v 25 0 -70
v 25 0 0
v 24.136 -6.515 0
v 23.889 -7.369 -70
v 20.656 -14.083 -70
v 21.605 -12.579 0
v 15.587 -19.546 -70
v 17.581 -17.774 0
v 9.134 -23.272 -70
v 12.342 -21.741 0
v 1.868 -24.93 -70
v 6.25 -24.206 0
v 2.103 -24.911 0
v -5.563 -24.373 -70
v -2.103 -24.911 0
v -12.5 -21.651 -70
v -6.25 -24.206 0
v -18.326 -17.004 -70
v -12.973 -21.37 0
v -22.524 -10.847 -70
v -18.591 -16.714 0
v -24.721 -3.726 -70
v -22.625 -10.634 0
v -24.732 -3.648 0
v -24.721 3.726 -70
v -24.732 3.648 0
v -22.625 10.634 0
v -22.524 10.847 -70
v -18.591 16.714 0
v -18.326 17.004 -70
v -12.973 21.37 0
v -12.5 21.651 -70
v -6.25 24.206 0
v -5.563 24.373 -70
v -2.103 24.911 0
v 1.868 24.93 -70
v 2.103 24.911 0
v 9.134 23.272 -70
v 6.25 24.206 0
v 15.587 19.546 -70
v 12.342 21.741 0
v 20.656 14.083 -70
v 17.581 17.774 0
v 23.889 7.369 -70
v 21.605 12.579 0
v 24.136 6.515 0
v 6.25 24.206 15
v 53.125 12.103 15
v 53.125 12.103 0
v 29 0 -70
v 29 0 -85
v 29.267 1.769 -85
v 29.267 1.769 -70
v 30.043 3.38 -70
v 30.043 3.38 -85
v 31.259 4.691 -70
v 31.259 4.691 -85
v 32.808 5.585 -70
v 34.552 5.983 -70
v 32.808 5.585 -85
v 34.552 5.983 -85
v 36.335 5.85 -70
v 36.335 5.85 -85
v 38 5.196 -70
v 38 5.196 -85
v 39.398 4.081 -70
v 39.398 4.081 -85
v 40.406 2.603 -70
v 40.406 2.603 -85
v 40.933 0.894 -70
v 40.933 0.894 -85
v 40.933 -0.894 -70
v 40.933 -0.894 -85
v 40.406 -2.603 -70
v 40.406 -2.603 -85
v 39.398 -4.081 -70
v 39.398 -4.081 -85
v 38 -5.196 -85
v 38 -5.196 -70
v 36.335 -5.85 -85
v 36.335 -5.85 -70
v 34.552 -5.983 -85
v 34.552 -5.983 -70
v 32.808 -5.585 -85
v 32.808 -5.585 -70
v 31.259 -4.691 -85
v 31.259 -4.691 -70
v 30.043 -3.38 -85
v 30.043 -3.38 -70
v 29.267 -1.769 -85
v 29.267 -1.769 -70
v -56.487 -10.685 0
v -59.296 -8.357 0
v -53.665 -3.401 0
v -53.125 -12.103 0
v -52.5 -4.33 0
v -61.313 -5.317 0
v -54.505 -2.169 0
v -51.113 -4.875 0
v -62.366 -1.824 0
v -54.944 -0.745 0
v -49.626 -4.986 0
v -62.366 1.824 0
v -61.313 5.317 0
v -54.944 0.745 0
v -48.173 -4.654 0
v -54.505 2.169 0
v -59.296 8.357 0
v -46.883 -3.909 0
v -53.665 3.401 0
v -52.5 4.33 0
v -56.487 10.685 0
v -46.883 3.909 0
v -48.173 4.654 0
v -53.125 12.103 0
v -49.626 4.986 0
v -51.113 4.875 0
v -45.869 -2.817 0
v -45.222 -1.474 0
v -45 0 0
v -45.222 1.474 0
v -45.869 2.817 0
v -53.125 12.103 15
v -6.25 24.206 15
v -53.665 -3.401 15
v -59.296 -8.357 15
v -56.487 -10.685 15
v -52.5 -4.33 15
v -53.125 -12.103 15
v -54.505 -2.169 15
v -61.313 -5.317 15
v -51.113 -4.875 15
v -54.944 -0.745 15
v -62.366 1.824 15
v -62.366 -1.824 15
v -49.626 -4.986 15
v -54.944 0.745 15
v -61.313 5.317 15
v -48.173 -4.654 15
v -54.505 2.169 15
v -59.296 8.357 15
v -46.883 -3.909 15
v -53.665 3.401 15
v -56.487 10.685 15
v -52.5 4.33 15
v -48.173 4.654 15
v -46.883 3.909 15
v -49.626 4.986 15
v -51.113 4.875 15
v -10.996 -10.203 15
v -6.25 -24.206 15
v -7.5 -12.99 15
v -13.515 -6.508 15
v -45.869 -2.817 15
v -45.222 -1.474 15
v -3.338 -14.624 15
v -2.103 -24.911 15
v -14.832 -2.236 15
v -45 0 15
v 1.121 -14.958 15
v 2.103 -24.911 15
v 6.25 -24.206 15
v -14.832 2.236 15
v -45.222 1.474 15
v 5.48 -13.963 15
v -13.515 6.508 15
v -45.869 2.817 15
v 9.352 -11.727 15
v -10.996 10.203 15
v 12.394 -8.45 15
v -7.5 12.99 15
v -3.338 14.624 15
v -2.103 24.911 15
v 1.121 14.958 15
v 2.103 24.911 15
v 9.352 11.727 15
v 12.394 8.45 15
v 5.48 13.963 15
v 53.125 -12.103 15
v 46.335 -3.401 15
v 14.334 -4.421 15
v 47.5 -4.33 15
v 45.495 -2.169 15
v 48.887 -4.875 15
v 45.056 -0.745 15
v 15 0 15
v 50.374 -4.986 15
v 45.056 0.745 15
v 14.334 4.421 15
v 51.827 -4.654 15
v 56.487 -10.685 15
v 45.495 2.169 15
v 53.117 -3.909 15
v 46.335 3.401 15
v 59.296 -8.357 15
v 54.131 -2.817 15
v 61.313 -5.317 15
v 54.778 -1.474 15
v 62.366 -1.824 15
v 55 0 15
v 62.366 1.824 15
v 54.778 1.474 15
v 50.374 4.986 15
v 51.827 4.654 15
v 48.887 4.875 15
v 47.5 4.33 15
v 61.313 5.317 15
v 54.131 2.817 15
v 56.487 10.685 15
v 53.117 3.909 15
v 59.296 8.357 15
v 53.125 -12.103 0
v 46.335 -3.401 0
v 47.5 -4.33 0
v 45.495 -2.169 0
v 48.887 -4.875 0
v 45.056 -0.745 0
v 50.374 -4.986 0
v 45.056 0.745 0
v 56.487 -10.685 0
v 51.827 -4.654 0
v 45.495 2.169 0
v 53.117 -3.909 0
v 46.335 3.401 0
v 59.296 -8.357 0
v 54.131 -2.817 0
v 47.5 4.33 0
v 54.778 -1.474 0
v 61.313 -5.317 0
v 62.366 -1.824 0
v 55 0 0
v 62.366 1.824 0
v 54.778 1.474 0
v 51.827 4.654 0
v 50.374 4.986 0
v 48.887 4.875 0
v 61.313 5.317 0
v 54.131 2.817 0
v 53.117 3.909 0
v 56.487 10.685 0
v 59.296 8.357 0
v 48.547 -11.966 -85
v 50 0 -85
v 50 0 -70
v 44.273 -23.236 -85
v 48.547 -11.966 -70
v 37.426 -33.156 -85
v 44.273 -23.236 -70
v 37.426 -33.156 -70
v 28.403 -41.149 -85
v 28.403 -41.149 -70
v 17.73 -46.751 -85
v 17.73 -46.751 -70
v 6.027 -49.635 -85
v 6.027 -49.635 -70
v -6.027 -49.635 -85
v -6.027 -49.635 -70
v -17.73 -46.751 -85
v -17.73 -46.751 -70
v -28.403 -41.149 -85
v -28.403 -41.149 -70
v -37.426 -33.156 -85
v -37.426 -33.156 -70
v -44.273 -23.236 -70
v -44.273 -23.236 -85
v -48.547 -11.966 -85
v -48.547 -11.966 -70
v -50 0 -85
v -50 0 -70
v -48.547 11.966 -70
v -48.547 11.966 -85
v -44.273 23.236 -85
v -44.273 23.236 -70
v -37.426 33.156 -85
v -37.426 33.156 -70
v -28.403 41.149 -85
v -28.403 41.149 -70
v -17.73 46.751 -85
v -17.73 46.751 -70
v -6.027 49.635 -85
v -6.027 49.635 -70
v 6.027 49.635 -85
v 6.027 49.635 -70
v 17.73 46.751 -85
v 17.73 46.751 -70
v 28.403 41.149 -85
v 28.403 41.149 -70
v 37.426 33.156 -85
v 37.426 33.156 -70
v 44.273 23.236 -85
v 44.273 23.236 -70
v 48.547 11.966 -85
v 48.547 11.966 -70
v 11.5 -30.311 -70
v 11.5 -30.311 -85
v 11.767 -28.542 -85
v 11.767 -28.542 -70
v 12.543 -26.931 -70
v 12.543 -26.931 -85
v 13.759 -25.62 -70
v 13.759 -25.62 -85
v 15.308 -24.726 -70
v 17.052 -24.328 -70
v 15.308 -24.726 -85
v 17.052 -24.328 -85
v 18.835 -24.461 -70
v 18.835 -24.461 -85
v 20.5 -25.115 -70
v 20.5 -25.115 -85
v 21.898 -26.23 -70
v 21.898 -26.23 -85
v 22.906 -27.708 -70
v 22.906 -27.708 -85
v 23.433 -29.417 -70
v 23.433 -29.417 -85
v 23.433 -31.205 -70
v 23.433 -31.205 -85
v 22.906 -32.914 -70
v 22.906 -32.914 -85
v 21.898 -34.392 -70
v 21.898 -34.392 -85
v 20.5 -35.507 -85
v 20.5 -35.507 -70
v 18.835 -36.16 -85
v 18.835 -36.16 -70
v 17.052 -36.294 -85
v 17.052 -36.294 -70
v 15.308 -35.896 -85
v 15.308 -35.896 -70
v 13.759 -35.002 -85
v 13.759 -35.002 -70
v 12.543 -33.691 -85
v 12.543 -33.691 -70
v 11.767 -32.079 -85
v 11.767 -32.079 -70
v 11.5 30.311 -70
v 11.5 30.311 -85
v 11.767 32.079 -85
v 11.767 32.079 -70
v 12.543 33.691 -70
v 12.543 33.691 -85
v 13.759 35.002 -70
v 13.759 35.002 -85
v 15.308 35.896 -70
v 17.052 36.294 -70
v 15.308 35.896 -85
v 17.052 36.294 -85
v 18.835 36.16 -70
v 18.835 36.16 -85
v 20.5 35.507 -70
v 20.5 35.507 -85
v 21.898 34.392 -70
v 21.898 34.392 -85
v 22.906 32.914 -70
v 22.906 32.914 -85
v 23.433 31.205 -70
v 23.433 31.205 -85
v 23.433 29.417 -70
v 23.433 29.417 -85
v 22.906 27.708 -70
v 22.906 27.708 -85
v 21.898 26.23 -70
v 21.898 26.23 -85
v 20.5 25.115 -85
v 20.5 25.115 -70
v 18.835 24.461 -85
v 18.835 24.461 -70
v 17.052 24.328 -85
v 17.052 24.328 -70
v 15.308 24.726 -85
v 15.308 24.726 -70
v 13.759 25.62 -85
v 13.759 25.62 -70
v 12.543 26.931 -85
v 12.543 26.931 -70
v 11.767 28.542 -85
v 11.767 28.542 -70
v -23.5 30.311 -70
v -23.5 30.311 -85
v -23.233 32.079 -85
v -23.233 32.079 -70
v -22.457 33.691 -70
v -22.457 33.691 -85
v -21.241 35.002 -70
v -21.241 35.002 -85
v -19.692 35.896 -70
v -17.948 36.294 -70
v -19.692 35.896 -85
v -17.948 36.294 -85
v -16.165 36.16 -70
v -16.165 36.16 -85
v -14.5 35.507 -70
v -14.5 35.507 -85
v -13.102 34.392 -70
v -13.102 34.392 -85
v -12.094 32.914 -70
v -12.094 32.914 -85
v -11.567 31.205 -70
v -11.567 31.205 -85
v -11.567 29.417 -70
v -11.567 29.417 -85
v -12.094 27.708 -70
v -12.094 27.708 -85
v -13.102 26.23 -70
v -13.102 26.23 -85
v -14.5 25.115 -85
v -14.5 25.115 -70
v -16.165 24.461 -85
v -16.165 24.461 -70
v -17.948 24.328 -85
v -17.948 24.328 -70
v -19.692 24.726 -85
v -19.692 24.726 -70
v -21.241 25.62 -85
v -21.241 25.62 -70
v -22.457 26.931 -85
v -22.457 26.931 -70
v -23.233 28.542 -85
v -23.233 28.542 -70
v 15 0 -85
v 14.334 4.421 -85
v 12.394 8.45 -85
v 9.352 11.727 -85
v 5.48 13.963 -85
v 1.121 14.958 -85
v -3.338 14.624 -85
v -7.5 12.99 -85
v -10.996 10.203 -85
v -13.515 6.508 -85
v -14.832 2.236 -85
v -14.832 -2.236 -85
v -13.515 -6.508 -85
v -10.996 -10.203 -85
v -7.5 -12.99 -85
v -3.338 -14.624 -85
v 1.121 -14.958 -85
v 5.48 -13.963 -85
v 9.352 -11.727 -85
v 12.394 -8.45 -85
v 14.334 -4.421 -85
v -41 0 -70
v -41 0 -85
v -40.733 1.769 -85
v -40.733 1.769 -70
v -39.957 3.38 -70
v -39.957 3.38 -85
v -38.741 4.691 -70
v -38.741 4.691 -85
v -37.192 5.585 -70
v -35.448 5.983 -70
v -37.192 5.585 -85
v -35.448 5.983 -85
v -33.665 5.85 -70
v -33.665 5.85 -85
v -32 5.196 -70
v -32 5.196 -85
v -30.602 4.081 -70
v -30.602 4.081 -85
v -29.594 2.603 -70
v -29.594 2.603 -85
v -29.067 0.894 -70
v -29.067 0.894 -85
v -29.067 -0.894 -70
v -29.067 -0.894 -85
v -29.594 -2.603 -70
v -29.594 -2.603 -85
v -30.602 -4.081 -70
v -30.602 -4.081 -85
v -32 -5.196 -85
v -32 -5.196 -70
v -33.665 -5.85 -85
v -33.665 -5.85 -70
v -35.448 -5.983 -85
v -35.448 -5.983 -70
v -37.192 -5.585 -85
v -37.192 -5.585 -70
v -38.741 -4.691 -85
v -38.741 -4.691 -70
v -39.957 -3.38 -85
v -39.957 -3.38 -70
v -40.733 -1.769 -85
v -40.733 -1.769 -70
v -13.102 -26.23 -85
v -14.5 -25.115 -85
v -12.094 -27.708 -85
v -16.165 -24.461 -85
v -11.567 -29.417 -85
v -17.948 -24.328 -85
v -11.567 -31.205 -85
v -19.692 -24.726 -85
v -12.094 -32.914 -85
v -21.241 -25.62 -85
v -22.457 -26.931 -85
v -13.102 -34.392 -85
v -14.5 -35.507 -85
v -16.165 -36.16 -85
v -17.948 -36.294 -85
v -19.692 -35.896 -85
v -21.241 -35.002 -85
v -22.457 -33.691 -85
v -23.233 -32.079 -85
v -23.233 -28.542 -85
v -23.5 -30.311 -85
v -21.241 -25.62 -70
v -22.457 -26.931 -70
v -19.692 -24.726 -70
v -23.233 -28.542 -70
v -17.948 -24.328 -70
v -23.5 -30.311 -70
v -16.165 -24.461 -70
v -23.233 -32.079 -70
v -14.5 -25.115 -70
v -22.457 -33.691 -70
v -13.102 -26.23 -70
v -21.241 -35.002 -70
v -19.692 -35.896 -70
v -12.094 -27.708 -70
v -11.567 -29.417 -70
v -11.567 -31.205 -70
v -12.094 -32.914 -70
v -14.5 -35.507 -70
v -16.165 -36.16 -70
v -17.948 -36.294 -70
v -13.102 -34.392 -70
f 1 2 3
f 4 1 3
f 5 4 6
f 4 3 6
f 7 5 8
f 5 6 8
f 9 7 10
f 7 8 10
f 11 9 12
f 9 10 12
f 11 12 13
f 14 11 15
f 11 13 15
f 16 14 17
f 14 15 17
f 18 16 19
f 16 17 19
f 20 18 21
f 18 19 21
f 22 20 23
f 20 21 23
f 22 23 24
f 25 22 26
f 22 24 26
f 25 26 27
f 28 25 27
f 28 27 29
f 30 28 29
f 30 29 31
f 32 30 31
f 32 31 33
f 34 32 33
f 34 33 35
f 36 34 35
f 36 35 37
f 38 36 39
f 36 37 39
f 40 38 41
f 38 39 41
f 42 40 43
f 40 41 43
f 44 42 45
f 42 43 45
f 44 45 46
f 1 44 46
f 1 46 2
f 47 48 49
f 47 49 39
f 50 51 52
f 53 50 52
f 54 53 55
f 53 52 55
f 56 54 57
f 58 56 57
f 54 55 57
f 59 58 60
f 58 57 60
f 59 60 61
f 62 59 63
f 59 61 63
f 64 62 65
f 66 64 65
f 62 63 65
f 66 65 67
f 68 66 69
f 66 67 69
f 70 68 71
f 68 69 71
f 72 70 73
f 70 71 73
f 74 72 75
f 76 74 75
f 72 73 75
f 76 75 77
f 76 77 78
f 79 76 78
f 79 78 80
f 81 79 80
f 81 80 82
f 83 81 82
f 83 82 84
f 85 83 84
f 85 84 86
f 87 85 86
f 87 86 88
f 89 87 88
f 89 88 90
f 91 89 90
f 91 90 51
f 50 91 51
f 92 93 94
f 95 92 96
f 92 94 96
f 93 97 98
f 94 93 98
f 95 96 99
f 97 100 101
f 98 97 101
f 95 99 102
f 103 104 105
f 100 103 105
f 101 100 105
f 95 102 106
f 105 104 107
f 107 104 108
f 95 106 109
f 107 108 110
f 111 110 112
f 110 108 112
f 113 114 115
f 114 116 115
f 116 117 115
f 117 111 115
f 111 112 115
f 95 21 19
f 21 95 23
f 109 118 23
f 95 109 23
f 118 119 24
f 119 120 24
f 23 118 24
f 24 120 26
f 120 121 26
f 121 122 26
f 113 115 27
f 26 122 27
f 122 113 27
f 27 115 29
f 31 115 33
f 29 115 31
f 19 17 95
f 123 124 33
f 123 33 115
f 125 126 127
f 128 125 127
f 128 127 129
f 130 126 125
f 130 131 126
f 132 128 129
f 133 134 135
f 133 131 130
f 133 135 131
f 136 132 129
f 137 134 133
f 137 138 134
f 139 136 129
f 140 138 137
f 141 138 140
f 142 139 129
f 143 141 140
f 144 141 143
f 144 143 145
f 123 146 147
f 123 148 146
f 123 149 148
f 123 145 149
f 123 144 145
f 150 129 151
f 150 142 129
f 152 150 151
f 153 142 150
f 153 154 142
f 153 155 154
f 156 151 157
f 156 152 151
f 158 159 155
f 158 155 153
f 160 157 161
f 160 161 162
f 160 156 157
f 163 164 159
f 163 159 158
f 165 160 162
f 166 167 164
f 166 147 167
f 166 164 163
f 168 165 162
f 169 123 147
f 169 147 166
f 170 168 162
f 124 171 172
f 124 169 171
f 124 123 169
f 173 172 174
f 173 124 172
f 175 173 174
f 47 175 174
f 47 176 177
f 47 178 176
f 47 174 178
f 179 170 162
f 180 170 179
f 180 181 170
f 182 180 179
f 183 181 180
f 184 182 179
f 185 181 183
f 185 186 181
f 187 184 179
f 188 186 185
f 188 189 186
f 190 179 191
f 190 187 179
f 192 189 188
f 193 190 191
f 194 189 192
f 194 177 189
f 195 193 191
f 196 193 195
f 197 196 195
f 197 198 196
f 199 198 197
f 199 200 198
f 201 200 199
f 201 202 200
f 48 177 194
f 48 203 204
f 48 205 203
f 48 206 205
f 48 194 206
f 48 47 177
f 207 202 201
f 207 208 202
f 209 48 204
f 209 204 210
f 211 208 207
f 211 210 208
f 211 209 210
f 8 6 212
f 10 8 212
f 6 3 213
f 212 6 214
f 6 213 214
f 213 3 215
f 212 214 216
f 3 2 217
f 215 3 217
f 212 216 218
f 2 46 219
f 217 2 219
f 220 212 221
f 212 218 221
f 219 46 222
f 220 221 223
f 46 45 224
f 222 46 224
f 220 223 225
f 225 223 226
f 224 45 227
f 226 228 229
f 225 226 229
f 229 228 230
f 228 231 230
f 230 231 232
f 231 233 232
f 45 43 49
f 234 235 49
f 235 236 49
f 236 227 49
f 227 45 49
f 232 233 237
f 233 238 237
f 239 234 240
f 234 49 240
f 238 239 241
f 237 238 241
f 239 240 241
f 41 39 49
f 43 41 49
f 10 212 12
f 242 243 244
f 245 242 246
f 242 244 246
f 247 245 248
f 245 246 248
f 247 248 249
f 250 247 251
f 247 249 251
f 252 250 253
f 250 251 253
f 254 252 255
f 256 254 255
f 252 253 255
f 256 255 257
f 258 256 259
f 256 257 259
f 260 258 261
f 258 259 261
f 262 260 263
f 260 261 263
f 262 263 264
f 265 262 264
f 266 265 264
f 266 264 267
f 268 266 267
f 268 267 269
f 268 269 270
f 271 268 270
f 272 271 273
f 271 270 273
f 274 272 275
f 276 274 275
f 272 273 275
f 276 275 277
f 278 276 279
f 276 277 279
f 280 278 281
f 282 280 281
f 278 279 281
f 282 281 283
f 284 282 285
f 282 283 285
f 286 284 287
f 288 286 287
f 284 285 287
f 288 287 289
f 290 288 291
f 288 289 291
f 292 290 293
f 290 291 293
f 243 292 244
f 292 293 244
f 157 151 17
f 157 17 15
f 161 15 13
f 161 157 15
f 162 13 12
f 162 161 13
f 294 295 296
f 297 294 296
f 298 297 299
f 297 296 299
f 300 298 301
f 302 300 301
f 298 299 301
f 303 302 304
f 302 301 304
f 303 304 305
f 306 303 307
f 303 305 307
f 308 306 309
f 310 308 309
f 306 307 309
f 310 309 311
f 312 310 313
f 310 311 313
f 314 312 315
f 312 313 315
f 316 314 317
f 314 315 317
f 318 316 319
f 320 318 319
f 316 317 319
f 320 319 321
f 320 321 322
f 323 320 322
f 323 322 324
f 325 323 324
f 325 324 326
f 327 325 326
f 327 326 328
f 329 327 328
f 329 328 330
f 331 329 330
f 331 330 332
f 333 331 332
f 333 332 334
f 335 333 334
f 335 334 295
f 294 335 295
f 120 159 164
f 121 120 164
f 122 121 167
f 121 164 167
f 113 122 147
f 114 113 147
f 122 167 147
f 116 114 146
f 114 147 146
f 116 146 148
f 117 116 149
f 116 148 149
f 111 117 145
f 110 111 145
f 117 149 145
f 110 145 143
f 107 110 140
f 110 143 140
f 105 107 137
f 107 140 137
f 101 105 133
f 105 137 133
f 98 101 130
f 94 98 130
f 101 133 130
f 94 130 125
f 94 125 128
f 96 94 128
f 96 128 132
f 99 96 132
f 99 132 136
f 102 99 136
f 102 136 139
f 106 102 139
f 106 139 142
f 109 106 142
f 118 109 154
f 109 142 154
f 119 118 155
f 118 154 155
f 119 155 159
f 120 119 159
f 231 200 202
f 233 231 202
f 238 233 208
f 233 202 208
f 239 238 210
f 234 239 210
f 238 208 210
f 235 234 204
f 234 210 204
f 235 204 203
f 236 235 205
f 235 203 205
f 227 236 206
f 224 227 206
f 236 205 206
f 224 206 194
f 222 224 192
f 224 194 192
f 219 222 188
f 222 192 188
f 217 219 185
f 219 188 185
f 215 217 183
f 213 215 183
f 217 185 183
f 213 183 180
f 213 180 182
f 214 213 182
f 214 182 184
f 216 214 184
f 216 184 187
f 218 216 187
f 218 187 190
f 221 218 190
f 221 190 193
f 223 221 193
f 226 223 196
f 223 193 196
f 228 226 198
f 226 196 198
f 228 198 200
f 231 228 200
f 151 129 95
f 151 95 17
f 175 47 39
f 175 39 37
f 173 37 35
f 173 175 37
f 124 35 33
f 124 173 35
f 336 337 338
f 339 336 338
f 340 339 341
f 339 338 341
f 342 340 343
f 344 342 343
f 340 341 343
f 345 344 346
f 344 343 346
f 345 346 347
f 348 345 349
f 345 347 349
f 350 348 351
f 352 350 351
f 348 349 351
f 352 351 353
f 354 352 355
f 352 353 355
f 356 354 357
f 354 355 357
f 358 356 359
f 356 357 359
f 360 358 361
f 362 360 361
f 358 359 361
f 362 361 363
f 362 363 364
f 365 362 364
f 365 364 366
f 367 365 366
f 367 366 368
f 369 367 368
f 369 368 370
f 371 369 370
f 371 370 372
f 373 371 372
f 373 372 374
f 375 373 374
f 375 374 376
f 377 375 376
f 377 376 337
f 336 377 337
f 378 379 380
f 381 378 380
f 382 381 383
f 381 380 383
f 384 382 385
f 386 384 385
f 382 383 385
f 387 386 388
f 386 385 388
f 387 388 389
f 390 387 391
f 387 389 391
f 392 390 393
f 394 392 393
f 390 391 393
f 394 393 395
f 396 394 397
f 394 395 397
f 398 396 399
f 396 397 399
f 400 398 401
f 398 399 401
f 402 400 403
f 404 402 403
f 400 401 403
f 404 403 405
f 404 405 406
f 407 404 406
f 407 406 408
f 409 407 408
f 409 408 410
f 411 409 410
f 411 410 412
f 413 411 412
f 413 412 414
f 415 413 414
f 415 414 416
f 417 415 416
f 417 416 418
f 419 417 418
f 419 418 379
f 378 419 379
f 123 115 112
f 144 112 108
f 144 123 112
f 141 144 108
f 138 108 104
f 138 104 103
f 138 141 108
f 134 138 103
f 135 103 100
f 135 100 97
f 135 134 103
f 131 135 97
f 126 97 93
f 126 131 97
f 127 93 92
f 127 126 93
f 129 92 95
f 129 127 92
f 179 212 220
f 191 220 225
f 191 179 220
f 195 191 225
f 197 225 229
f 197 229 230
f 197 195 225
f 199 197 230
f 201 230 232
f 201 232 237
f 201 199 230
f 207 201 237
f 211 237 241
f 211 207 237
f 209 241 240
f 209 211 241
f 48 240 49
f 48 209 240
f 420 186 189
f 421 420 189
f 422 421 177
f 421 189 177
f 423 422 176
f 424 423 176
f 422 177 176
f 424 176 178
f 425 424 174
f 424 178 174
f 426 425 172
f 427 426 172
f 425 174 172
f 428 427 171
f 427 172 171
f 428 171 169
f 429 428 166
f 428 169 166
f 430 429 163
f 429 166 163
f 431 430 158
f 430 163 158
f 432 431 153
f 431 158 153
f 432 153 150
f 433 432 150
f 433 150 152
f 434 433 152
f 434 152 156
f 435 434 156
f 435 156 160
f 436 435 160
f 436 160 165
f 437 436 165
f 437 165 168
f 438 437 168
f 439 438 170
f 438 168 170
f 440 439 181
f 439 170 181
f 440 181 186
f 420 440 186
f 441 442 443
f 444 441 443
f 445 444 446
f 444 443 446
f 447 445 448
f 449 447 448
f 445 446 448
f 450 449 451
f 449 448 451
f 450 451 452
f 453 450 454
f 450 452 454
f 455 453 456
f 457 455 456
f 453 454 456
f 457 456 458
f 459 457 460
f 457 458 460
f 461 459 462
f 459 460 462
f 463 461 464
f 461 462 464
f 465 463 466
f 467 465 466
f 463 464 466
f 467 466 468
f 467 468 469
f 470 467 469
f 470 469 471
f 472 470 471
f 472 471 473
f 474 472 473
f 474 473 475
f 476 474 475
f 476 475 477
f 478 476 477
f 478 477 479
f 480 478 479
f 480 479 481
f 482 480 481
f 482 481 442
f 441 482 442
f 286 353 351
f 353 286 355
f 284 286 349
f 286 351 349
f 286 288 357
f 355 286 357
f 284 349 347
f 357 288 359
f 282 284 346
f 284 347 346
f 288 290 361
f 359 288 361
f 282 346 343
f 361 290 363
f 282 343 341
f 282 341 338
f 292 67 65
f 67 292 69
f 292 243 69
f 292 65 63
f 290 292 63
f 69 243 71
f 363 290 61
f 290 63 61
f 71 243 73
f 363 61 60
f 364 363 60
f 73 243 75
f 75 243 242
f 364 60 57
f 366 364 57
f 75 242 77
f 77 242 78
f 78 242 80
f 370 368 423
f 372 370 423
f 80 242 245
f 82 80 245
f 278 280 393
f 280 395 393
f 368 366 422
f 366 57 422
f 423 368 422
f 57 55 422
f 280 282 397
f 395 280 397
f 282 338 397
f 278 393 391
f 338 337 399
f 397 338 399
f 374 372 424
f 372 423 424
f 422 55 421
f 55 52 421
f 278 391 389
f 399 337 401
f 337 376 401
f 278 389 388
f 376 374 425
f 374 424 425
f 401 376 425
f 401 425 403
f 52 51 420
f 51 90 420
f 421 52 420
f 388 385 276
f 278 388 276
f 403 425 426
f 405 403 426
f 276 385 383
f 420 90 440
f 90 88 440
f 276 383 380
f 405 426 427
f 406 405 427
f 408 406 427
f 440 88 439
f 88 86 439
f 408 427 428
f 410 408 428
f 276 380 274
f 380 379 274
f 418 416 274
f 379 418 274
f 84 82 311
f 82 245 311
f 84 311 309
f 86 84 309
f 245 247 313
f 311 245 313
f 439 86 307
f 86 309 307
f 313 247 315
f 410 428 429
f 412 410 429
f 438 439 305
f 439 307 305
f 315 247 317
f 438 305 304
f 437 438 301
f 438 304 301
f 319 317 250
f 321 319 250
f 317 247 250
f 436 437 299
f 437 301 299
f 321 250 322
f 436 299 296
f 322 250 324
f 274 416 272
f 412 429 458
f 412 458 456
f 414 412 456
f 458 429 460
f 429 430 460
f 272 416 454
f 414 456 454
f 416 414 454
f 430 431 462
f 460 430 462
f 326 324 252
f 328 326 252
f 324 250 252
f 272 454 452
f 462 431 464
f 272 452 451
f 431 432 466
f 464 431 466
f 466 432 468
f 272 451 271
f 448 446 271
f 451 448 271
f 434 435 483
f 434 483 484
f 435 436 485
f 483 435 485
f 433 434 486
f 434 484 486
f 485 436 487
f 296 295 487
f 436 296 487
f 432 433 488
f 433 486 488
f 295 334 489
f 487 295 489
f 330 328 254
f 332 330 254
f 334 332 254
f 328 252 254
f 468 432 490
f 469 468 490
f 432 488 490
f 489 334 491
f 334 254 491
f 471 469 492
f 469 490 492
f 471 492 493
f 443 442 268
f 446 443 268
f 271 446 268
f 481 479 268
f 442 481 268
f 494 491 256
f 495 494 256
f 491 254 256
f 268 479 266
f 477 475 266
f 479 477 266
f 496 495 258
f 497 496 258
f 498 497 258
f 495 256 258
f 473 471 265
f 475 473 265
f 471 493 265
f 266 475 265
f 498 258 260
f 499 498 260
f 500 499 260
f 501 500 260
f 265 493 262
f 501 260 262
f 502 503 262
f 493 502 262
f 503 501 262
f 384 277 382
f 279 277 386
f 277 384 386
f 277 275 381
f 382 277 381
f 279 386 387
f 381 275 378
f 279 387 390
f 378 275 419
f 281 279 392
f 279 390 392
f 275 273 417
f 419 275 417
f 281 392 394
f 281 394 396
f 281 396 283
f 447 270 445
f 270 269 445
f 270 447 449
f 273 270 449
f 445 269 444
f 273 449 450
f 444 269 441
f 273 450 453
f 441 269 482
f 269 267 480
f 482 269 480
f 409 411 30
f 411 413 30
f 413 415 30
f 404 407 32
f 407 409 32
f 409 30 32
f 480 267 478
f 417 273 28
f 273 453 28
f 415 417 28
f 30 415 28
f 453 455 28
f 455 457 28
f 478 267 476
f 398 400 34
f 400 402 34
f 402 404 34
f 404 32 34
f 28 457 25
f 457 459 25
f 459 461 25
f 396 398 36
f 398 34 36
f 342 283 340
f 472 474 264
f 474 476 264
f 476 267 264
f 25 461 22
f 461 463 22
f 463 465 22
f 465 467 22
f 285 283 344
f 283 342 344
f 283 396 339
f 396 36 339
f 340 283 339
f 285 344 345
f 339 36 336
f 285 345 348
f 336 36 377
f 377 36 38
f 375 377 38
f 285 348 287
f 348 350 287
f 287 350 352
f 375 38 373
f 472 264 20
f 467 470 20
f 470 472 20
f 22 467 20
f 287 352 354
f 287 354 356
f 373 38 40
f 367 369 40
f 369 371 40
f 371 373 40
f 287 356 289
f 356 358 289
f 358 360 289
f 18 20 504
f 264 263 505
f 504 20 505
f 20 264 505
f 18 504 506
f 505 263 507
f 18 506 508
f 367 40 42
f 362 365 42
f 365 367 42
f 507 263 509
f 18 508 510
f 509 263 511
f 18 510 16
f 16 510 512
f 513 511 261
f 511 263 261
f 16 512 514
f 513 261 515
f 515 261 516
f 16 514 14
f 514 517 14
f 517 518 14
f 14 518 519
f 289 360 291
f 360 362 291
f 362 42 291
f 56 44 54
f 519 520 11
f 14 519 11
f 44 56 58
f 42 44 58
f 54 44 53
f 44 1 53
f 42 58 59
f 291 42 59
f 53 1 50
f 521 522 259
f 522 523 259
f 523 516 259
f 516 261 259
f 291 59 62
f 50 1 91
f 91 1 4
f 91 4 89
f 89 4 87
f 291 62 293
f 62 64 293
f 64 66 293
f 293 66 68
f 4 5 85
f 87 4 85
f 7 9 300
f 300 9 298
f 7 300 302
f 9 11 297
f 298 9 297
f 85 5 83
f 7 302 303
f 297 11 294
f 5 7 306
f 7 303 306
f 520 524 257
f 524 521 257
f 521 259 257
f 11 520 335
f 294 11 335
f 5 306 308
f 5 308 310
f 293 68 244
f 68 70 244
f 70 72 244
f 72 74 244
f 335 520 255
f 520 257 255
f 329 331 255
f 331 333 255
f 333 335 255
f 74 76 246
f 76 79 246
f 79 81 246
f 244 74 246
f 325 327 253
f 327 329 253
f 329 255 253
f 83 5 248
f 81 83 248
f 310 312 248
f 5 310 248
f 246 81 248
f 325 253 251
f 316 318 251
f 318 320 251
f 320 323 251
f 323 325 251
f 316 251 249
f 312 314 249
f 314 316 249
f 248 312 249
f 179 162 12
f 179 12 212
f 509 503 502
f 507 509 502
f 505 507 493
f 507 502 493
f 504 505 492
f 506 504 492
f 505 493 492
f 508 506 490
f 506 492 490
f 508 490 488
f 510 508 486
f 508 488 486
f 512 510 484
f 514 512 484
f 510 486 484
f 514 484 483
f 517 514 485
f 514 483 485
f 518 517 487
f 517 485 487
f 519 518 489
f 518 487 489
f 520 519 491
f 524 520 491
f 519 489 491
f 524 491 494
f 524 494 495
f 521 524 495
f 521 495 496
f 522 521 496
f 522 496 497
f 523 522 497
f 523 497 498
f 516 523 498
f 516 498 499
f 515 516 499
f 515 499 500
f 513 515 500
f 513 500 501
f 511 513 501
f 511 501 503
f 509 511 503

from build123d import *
from build123d.topology import SkipClean

# Parameters (mm, degrees)
BOSS_EXTRUDE1_START         = 15
SKETCH2_R                   = 5
BOSS_EXTRUDE1_DEPTH         = 15
SKETCH3_R                   = 15
CUT_EXTRUDE1_DEPTH          = 100
F_12_0MM_DOWEL_HOLE1_REACH  = 130.087
F_12_0MM_DOWEL_HOLE1_BORE_R = 6


with BuildPart() as part:
    # Sketch1 → Revolve1 (revolve)
    with BuildSketch(Plane(origin=(0, 0, 0), x_dir=(0, 0, -1), z_dir=(1, 0, 0)), mode=Mode.PRIVATE) as revolve1_sk:
        Polygon((85, 0), (85, 50), (70, 50), (70, 25), (0, 25), (0, 0), align=None)
    revolve(revolve1_sk.sketch.rotate(Axis((0, 0, 0), (0, 0, -1)), 90), axis=Axis((0, 0, 0), (0, 0, -1)))

    # Sketch2 → Boss-Extrude1 (add)
    with SkipClean():  # the faces are left unmerged after this step: merging them gives an invalid solid
        with BuildSketch(Plane.XY.offset(BOSS_EXTRUDE1_START)):
            with BuildLine():
                Line((-6.25, 24.206145914), (-53.125, 12.103072957))
                ThreePointArc((-53.125, 12.103072957), (-62.5, 0), (-53.125, -12.103072957))
                Line((-53.125, -12.103072957), (-6.25, -24.206145914))
                ThreePointArc((-6.25, -24.206145914), (0, -25), (6.25, -24.206145914))
                Line((6.25, -24.206145914), (53.125, -12.103072957))
                ThreePointArc((53.125, -12.103072957), (62.5, 0), (53.125, 12.103072957))
                Line((53.125, 12.103072957), (6.25, 24.206145914))
                ThreePointArc((6.25, 24.206145914), (0, 25), (-6.25, 24.206145914))
            make_face()
            with Locations((-50, 0)):
                Circle(SKETCH2_R, mode=Mode.SUBTRACT)
            with Locations((50, 0)):
                Circle(SKETCH2_R, mode=Mode.SUBTRACT)
        extrude(amount=-BOSS_EXTRUDE1_DEPTH)

    # Sketch3 → Cut-Extrude1 (cut)
    with SkipClean():  # the faces are left unmerged after this step: merging them gives an invalid solid
        with BuildSketch(Plane.XY.offset(15)):
            Circle(SKETCH3_R)
        extrude(amount=-CUT_EXTRUDE1_DEPTH, mode=Mode.SUBTRACT)

    # Ø12.0mm Dowel Hole1 bore → Ø12.0mm Dowel Hole1 (cut, up to next)
    with BuildSketch(Plane(origin=(0, 0, -85), x_dir=(-1, 0, 0), z_dir=(0, 0, -1)), mode=Mode.PRIVATE) as f_12_0mm_dowel_hole1_sk1:
        with Locations((-17.5, -30.310889132)):
            Circle(F_12_0MM_DOWEL_HOLE1_BORE_R)
    f_12_0mm_dowel_hole1_tool1 = extrude(f_12_0mm_dowel_hole1_sk1.sketch, amount=-F_12_0MM_DOWEL_HOLE1_REACH, mode=Mode.PRIVATE) & part.part
    # Ø12.0mm Dowel Hole1 bore → Ø12.0mm Dowel Hole1 (cut, up to next)
    with BuildSketch(Plane(origin=(0, 0, -85), x_dir=(-1, 0, 0), z_dir=(0, 0, -1)), mode=Mode.PRIVATE) as f_12_0mm_dowel_hole1_sk2:
        with Locations((-35, 0)):
            Circle(F_12_0MM_DOWEL_HOLE1_BORE_R)
    f_12_0mm_dowel_hole1_tool2 = extrude(f_12_0mm_dowel_hole1_sk2.sketch, amount=-F_12_0MM_DOWEL_HOLE1_REACH, mode=Mode.PRIVATE) & part.part
    # Ø12.0mm Dowel Hole1 bore → Ø12.0mm Dowel Hole1 (cut, up to next)
    with BuildSketch(Plane(origin=(0, 0, -85), x_dir=(-1, 0, 0), z_dir=(0, 0, -1)), mode=Mode.PRIVATE) as f_12_0mm_dowel_hole1_sk3:
        with Locations((-17.5, 30.310889132)):
            Circle(F_12_0MM_DOWEL_HOLE1_BORE_R)
    f_12_0mm_dowel_hole1_tool3 = extrude(f_12_0mm_dowel_hole1_sk3.sketch, amount=-F_12_0MM_DOWEL_HOLE1_REACH, mode=Mode.PRIVATE) & part.part
    # Ø12.0mm Dowel Hole1 bore → Ø12.0mm Dowel Hole1 (cut, up to next)
    with BuildSketch(Plane(origin=(0, 0, -85), x_dir=(-1, 0, 0), z_dir=(0, 0, -1)), mode=Mode.PRIVATE) as f_12_0mm_dowel_hole1_sk4:
        with Locations((17.5, 30.310889132)):
            Circle(F_12_0MM_DOWEL_HOLE1_BORE_R)
    f_12_0mm_dowel_hole1_tool4 = extrude(f_12_0mm_dowel_hole1_sk4.sketch, amount=-F_12_0MM_DOWEL_HOLE1_REACH, mode=Mode.PRIVATE) & part.part
    # Ø12.0mm Dowel Hole1 bore → Ø12.0mm Dowel Hole1 (cut, up to next)
    with BuildSketch(Plane(origin=(0, 0, -85), x_dir=(-1, 0, 0), z_dir=(0, 0, -1)), mode=Mode.PRIVATE) as f_12_0mm_dowel_hole1_sk5:
        with Locations((35, 0)):
            Circle(F_12_0MM_DOWEL_HOLE1_BORE_R)
    f_12_0mm_dowel_hole1_tool5 = extrude(f_12_0mm_dowel_hole1_sk5.sketch, amount=-F_12_0MM_DOWEL_HOLE1_REACH, mode=Mode.PRIVATE) & part.part
    # Ø12.0mm Dowel Hole1 bore → Ø12.0mm Dowel Hole1 (cut, up to next)
    with BuildSketch(Plane(origin=(0, 0, -85), x_dir=(-1, 0, 0), z_dir=(0, 0, -1)), mode=Mode.PRIVATE) as f_12_0mm_dowel_hole1_sk6:
        with Locations((17.5, -30.310889132)):
            Circle(F_12_0MM_DOWEL_HOLE1_BORE_R)
    f_12_0mm_dowel_hole1_tool6 = extrude(f_12_0mm_dowel_hole1_sk6.sketch, amount=-F_12_0MM_DOWEL_HOLE1_REACH, mode=Mode.PRIVATE) & part.part
    add(f_12_0mm_dowel_hole1_tool1.solids().sort_by_distance((17.5, -30.310889, -85))[0], mode=Mode.SUBTRACT)
    add(f_12_0mm_dowel_hole1_tool2.solids().sort_by_distance((35, 0, -85))[0], mode=Mode.SUBTRACT)
    add(f_12_0mm_dowel_hole1_tool3.solids().sort_by_distance((17.5, 30.310889, -85))[0], mode=Mode.SUBTRACT)
    add(f_12_0mm_dowel_hole1_tool4.solids().sort_by_distance((-17.5, 30.310889, -85))[0], mode=Mode.SUBTRACT)
    add(f_12_0mm_dowel_hole1_tool5.solids().sort_by_distance((-35, 0, -85))[0], mode=Mode.SUBTRACT)
    add(f_12_0mm_dowel_hole1_tool6.solids().sort_by_distance((-17.5, -30.310889, -85))[0], mode=Mode.SUBTRACT)


solid = part.part
